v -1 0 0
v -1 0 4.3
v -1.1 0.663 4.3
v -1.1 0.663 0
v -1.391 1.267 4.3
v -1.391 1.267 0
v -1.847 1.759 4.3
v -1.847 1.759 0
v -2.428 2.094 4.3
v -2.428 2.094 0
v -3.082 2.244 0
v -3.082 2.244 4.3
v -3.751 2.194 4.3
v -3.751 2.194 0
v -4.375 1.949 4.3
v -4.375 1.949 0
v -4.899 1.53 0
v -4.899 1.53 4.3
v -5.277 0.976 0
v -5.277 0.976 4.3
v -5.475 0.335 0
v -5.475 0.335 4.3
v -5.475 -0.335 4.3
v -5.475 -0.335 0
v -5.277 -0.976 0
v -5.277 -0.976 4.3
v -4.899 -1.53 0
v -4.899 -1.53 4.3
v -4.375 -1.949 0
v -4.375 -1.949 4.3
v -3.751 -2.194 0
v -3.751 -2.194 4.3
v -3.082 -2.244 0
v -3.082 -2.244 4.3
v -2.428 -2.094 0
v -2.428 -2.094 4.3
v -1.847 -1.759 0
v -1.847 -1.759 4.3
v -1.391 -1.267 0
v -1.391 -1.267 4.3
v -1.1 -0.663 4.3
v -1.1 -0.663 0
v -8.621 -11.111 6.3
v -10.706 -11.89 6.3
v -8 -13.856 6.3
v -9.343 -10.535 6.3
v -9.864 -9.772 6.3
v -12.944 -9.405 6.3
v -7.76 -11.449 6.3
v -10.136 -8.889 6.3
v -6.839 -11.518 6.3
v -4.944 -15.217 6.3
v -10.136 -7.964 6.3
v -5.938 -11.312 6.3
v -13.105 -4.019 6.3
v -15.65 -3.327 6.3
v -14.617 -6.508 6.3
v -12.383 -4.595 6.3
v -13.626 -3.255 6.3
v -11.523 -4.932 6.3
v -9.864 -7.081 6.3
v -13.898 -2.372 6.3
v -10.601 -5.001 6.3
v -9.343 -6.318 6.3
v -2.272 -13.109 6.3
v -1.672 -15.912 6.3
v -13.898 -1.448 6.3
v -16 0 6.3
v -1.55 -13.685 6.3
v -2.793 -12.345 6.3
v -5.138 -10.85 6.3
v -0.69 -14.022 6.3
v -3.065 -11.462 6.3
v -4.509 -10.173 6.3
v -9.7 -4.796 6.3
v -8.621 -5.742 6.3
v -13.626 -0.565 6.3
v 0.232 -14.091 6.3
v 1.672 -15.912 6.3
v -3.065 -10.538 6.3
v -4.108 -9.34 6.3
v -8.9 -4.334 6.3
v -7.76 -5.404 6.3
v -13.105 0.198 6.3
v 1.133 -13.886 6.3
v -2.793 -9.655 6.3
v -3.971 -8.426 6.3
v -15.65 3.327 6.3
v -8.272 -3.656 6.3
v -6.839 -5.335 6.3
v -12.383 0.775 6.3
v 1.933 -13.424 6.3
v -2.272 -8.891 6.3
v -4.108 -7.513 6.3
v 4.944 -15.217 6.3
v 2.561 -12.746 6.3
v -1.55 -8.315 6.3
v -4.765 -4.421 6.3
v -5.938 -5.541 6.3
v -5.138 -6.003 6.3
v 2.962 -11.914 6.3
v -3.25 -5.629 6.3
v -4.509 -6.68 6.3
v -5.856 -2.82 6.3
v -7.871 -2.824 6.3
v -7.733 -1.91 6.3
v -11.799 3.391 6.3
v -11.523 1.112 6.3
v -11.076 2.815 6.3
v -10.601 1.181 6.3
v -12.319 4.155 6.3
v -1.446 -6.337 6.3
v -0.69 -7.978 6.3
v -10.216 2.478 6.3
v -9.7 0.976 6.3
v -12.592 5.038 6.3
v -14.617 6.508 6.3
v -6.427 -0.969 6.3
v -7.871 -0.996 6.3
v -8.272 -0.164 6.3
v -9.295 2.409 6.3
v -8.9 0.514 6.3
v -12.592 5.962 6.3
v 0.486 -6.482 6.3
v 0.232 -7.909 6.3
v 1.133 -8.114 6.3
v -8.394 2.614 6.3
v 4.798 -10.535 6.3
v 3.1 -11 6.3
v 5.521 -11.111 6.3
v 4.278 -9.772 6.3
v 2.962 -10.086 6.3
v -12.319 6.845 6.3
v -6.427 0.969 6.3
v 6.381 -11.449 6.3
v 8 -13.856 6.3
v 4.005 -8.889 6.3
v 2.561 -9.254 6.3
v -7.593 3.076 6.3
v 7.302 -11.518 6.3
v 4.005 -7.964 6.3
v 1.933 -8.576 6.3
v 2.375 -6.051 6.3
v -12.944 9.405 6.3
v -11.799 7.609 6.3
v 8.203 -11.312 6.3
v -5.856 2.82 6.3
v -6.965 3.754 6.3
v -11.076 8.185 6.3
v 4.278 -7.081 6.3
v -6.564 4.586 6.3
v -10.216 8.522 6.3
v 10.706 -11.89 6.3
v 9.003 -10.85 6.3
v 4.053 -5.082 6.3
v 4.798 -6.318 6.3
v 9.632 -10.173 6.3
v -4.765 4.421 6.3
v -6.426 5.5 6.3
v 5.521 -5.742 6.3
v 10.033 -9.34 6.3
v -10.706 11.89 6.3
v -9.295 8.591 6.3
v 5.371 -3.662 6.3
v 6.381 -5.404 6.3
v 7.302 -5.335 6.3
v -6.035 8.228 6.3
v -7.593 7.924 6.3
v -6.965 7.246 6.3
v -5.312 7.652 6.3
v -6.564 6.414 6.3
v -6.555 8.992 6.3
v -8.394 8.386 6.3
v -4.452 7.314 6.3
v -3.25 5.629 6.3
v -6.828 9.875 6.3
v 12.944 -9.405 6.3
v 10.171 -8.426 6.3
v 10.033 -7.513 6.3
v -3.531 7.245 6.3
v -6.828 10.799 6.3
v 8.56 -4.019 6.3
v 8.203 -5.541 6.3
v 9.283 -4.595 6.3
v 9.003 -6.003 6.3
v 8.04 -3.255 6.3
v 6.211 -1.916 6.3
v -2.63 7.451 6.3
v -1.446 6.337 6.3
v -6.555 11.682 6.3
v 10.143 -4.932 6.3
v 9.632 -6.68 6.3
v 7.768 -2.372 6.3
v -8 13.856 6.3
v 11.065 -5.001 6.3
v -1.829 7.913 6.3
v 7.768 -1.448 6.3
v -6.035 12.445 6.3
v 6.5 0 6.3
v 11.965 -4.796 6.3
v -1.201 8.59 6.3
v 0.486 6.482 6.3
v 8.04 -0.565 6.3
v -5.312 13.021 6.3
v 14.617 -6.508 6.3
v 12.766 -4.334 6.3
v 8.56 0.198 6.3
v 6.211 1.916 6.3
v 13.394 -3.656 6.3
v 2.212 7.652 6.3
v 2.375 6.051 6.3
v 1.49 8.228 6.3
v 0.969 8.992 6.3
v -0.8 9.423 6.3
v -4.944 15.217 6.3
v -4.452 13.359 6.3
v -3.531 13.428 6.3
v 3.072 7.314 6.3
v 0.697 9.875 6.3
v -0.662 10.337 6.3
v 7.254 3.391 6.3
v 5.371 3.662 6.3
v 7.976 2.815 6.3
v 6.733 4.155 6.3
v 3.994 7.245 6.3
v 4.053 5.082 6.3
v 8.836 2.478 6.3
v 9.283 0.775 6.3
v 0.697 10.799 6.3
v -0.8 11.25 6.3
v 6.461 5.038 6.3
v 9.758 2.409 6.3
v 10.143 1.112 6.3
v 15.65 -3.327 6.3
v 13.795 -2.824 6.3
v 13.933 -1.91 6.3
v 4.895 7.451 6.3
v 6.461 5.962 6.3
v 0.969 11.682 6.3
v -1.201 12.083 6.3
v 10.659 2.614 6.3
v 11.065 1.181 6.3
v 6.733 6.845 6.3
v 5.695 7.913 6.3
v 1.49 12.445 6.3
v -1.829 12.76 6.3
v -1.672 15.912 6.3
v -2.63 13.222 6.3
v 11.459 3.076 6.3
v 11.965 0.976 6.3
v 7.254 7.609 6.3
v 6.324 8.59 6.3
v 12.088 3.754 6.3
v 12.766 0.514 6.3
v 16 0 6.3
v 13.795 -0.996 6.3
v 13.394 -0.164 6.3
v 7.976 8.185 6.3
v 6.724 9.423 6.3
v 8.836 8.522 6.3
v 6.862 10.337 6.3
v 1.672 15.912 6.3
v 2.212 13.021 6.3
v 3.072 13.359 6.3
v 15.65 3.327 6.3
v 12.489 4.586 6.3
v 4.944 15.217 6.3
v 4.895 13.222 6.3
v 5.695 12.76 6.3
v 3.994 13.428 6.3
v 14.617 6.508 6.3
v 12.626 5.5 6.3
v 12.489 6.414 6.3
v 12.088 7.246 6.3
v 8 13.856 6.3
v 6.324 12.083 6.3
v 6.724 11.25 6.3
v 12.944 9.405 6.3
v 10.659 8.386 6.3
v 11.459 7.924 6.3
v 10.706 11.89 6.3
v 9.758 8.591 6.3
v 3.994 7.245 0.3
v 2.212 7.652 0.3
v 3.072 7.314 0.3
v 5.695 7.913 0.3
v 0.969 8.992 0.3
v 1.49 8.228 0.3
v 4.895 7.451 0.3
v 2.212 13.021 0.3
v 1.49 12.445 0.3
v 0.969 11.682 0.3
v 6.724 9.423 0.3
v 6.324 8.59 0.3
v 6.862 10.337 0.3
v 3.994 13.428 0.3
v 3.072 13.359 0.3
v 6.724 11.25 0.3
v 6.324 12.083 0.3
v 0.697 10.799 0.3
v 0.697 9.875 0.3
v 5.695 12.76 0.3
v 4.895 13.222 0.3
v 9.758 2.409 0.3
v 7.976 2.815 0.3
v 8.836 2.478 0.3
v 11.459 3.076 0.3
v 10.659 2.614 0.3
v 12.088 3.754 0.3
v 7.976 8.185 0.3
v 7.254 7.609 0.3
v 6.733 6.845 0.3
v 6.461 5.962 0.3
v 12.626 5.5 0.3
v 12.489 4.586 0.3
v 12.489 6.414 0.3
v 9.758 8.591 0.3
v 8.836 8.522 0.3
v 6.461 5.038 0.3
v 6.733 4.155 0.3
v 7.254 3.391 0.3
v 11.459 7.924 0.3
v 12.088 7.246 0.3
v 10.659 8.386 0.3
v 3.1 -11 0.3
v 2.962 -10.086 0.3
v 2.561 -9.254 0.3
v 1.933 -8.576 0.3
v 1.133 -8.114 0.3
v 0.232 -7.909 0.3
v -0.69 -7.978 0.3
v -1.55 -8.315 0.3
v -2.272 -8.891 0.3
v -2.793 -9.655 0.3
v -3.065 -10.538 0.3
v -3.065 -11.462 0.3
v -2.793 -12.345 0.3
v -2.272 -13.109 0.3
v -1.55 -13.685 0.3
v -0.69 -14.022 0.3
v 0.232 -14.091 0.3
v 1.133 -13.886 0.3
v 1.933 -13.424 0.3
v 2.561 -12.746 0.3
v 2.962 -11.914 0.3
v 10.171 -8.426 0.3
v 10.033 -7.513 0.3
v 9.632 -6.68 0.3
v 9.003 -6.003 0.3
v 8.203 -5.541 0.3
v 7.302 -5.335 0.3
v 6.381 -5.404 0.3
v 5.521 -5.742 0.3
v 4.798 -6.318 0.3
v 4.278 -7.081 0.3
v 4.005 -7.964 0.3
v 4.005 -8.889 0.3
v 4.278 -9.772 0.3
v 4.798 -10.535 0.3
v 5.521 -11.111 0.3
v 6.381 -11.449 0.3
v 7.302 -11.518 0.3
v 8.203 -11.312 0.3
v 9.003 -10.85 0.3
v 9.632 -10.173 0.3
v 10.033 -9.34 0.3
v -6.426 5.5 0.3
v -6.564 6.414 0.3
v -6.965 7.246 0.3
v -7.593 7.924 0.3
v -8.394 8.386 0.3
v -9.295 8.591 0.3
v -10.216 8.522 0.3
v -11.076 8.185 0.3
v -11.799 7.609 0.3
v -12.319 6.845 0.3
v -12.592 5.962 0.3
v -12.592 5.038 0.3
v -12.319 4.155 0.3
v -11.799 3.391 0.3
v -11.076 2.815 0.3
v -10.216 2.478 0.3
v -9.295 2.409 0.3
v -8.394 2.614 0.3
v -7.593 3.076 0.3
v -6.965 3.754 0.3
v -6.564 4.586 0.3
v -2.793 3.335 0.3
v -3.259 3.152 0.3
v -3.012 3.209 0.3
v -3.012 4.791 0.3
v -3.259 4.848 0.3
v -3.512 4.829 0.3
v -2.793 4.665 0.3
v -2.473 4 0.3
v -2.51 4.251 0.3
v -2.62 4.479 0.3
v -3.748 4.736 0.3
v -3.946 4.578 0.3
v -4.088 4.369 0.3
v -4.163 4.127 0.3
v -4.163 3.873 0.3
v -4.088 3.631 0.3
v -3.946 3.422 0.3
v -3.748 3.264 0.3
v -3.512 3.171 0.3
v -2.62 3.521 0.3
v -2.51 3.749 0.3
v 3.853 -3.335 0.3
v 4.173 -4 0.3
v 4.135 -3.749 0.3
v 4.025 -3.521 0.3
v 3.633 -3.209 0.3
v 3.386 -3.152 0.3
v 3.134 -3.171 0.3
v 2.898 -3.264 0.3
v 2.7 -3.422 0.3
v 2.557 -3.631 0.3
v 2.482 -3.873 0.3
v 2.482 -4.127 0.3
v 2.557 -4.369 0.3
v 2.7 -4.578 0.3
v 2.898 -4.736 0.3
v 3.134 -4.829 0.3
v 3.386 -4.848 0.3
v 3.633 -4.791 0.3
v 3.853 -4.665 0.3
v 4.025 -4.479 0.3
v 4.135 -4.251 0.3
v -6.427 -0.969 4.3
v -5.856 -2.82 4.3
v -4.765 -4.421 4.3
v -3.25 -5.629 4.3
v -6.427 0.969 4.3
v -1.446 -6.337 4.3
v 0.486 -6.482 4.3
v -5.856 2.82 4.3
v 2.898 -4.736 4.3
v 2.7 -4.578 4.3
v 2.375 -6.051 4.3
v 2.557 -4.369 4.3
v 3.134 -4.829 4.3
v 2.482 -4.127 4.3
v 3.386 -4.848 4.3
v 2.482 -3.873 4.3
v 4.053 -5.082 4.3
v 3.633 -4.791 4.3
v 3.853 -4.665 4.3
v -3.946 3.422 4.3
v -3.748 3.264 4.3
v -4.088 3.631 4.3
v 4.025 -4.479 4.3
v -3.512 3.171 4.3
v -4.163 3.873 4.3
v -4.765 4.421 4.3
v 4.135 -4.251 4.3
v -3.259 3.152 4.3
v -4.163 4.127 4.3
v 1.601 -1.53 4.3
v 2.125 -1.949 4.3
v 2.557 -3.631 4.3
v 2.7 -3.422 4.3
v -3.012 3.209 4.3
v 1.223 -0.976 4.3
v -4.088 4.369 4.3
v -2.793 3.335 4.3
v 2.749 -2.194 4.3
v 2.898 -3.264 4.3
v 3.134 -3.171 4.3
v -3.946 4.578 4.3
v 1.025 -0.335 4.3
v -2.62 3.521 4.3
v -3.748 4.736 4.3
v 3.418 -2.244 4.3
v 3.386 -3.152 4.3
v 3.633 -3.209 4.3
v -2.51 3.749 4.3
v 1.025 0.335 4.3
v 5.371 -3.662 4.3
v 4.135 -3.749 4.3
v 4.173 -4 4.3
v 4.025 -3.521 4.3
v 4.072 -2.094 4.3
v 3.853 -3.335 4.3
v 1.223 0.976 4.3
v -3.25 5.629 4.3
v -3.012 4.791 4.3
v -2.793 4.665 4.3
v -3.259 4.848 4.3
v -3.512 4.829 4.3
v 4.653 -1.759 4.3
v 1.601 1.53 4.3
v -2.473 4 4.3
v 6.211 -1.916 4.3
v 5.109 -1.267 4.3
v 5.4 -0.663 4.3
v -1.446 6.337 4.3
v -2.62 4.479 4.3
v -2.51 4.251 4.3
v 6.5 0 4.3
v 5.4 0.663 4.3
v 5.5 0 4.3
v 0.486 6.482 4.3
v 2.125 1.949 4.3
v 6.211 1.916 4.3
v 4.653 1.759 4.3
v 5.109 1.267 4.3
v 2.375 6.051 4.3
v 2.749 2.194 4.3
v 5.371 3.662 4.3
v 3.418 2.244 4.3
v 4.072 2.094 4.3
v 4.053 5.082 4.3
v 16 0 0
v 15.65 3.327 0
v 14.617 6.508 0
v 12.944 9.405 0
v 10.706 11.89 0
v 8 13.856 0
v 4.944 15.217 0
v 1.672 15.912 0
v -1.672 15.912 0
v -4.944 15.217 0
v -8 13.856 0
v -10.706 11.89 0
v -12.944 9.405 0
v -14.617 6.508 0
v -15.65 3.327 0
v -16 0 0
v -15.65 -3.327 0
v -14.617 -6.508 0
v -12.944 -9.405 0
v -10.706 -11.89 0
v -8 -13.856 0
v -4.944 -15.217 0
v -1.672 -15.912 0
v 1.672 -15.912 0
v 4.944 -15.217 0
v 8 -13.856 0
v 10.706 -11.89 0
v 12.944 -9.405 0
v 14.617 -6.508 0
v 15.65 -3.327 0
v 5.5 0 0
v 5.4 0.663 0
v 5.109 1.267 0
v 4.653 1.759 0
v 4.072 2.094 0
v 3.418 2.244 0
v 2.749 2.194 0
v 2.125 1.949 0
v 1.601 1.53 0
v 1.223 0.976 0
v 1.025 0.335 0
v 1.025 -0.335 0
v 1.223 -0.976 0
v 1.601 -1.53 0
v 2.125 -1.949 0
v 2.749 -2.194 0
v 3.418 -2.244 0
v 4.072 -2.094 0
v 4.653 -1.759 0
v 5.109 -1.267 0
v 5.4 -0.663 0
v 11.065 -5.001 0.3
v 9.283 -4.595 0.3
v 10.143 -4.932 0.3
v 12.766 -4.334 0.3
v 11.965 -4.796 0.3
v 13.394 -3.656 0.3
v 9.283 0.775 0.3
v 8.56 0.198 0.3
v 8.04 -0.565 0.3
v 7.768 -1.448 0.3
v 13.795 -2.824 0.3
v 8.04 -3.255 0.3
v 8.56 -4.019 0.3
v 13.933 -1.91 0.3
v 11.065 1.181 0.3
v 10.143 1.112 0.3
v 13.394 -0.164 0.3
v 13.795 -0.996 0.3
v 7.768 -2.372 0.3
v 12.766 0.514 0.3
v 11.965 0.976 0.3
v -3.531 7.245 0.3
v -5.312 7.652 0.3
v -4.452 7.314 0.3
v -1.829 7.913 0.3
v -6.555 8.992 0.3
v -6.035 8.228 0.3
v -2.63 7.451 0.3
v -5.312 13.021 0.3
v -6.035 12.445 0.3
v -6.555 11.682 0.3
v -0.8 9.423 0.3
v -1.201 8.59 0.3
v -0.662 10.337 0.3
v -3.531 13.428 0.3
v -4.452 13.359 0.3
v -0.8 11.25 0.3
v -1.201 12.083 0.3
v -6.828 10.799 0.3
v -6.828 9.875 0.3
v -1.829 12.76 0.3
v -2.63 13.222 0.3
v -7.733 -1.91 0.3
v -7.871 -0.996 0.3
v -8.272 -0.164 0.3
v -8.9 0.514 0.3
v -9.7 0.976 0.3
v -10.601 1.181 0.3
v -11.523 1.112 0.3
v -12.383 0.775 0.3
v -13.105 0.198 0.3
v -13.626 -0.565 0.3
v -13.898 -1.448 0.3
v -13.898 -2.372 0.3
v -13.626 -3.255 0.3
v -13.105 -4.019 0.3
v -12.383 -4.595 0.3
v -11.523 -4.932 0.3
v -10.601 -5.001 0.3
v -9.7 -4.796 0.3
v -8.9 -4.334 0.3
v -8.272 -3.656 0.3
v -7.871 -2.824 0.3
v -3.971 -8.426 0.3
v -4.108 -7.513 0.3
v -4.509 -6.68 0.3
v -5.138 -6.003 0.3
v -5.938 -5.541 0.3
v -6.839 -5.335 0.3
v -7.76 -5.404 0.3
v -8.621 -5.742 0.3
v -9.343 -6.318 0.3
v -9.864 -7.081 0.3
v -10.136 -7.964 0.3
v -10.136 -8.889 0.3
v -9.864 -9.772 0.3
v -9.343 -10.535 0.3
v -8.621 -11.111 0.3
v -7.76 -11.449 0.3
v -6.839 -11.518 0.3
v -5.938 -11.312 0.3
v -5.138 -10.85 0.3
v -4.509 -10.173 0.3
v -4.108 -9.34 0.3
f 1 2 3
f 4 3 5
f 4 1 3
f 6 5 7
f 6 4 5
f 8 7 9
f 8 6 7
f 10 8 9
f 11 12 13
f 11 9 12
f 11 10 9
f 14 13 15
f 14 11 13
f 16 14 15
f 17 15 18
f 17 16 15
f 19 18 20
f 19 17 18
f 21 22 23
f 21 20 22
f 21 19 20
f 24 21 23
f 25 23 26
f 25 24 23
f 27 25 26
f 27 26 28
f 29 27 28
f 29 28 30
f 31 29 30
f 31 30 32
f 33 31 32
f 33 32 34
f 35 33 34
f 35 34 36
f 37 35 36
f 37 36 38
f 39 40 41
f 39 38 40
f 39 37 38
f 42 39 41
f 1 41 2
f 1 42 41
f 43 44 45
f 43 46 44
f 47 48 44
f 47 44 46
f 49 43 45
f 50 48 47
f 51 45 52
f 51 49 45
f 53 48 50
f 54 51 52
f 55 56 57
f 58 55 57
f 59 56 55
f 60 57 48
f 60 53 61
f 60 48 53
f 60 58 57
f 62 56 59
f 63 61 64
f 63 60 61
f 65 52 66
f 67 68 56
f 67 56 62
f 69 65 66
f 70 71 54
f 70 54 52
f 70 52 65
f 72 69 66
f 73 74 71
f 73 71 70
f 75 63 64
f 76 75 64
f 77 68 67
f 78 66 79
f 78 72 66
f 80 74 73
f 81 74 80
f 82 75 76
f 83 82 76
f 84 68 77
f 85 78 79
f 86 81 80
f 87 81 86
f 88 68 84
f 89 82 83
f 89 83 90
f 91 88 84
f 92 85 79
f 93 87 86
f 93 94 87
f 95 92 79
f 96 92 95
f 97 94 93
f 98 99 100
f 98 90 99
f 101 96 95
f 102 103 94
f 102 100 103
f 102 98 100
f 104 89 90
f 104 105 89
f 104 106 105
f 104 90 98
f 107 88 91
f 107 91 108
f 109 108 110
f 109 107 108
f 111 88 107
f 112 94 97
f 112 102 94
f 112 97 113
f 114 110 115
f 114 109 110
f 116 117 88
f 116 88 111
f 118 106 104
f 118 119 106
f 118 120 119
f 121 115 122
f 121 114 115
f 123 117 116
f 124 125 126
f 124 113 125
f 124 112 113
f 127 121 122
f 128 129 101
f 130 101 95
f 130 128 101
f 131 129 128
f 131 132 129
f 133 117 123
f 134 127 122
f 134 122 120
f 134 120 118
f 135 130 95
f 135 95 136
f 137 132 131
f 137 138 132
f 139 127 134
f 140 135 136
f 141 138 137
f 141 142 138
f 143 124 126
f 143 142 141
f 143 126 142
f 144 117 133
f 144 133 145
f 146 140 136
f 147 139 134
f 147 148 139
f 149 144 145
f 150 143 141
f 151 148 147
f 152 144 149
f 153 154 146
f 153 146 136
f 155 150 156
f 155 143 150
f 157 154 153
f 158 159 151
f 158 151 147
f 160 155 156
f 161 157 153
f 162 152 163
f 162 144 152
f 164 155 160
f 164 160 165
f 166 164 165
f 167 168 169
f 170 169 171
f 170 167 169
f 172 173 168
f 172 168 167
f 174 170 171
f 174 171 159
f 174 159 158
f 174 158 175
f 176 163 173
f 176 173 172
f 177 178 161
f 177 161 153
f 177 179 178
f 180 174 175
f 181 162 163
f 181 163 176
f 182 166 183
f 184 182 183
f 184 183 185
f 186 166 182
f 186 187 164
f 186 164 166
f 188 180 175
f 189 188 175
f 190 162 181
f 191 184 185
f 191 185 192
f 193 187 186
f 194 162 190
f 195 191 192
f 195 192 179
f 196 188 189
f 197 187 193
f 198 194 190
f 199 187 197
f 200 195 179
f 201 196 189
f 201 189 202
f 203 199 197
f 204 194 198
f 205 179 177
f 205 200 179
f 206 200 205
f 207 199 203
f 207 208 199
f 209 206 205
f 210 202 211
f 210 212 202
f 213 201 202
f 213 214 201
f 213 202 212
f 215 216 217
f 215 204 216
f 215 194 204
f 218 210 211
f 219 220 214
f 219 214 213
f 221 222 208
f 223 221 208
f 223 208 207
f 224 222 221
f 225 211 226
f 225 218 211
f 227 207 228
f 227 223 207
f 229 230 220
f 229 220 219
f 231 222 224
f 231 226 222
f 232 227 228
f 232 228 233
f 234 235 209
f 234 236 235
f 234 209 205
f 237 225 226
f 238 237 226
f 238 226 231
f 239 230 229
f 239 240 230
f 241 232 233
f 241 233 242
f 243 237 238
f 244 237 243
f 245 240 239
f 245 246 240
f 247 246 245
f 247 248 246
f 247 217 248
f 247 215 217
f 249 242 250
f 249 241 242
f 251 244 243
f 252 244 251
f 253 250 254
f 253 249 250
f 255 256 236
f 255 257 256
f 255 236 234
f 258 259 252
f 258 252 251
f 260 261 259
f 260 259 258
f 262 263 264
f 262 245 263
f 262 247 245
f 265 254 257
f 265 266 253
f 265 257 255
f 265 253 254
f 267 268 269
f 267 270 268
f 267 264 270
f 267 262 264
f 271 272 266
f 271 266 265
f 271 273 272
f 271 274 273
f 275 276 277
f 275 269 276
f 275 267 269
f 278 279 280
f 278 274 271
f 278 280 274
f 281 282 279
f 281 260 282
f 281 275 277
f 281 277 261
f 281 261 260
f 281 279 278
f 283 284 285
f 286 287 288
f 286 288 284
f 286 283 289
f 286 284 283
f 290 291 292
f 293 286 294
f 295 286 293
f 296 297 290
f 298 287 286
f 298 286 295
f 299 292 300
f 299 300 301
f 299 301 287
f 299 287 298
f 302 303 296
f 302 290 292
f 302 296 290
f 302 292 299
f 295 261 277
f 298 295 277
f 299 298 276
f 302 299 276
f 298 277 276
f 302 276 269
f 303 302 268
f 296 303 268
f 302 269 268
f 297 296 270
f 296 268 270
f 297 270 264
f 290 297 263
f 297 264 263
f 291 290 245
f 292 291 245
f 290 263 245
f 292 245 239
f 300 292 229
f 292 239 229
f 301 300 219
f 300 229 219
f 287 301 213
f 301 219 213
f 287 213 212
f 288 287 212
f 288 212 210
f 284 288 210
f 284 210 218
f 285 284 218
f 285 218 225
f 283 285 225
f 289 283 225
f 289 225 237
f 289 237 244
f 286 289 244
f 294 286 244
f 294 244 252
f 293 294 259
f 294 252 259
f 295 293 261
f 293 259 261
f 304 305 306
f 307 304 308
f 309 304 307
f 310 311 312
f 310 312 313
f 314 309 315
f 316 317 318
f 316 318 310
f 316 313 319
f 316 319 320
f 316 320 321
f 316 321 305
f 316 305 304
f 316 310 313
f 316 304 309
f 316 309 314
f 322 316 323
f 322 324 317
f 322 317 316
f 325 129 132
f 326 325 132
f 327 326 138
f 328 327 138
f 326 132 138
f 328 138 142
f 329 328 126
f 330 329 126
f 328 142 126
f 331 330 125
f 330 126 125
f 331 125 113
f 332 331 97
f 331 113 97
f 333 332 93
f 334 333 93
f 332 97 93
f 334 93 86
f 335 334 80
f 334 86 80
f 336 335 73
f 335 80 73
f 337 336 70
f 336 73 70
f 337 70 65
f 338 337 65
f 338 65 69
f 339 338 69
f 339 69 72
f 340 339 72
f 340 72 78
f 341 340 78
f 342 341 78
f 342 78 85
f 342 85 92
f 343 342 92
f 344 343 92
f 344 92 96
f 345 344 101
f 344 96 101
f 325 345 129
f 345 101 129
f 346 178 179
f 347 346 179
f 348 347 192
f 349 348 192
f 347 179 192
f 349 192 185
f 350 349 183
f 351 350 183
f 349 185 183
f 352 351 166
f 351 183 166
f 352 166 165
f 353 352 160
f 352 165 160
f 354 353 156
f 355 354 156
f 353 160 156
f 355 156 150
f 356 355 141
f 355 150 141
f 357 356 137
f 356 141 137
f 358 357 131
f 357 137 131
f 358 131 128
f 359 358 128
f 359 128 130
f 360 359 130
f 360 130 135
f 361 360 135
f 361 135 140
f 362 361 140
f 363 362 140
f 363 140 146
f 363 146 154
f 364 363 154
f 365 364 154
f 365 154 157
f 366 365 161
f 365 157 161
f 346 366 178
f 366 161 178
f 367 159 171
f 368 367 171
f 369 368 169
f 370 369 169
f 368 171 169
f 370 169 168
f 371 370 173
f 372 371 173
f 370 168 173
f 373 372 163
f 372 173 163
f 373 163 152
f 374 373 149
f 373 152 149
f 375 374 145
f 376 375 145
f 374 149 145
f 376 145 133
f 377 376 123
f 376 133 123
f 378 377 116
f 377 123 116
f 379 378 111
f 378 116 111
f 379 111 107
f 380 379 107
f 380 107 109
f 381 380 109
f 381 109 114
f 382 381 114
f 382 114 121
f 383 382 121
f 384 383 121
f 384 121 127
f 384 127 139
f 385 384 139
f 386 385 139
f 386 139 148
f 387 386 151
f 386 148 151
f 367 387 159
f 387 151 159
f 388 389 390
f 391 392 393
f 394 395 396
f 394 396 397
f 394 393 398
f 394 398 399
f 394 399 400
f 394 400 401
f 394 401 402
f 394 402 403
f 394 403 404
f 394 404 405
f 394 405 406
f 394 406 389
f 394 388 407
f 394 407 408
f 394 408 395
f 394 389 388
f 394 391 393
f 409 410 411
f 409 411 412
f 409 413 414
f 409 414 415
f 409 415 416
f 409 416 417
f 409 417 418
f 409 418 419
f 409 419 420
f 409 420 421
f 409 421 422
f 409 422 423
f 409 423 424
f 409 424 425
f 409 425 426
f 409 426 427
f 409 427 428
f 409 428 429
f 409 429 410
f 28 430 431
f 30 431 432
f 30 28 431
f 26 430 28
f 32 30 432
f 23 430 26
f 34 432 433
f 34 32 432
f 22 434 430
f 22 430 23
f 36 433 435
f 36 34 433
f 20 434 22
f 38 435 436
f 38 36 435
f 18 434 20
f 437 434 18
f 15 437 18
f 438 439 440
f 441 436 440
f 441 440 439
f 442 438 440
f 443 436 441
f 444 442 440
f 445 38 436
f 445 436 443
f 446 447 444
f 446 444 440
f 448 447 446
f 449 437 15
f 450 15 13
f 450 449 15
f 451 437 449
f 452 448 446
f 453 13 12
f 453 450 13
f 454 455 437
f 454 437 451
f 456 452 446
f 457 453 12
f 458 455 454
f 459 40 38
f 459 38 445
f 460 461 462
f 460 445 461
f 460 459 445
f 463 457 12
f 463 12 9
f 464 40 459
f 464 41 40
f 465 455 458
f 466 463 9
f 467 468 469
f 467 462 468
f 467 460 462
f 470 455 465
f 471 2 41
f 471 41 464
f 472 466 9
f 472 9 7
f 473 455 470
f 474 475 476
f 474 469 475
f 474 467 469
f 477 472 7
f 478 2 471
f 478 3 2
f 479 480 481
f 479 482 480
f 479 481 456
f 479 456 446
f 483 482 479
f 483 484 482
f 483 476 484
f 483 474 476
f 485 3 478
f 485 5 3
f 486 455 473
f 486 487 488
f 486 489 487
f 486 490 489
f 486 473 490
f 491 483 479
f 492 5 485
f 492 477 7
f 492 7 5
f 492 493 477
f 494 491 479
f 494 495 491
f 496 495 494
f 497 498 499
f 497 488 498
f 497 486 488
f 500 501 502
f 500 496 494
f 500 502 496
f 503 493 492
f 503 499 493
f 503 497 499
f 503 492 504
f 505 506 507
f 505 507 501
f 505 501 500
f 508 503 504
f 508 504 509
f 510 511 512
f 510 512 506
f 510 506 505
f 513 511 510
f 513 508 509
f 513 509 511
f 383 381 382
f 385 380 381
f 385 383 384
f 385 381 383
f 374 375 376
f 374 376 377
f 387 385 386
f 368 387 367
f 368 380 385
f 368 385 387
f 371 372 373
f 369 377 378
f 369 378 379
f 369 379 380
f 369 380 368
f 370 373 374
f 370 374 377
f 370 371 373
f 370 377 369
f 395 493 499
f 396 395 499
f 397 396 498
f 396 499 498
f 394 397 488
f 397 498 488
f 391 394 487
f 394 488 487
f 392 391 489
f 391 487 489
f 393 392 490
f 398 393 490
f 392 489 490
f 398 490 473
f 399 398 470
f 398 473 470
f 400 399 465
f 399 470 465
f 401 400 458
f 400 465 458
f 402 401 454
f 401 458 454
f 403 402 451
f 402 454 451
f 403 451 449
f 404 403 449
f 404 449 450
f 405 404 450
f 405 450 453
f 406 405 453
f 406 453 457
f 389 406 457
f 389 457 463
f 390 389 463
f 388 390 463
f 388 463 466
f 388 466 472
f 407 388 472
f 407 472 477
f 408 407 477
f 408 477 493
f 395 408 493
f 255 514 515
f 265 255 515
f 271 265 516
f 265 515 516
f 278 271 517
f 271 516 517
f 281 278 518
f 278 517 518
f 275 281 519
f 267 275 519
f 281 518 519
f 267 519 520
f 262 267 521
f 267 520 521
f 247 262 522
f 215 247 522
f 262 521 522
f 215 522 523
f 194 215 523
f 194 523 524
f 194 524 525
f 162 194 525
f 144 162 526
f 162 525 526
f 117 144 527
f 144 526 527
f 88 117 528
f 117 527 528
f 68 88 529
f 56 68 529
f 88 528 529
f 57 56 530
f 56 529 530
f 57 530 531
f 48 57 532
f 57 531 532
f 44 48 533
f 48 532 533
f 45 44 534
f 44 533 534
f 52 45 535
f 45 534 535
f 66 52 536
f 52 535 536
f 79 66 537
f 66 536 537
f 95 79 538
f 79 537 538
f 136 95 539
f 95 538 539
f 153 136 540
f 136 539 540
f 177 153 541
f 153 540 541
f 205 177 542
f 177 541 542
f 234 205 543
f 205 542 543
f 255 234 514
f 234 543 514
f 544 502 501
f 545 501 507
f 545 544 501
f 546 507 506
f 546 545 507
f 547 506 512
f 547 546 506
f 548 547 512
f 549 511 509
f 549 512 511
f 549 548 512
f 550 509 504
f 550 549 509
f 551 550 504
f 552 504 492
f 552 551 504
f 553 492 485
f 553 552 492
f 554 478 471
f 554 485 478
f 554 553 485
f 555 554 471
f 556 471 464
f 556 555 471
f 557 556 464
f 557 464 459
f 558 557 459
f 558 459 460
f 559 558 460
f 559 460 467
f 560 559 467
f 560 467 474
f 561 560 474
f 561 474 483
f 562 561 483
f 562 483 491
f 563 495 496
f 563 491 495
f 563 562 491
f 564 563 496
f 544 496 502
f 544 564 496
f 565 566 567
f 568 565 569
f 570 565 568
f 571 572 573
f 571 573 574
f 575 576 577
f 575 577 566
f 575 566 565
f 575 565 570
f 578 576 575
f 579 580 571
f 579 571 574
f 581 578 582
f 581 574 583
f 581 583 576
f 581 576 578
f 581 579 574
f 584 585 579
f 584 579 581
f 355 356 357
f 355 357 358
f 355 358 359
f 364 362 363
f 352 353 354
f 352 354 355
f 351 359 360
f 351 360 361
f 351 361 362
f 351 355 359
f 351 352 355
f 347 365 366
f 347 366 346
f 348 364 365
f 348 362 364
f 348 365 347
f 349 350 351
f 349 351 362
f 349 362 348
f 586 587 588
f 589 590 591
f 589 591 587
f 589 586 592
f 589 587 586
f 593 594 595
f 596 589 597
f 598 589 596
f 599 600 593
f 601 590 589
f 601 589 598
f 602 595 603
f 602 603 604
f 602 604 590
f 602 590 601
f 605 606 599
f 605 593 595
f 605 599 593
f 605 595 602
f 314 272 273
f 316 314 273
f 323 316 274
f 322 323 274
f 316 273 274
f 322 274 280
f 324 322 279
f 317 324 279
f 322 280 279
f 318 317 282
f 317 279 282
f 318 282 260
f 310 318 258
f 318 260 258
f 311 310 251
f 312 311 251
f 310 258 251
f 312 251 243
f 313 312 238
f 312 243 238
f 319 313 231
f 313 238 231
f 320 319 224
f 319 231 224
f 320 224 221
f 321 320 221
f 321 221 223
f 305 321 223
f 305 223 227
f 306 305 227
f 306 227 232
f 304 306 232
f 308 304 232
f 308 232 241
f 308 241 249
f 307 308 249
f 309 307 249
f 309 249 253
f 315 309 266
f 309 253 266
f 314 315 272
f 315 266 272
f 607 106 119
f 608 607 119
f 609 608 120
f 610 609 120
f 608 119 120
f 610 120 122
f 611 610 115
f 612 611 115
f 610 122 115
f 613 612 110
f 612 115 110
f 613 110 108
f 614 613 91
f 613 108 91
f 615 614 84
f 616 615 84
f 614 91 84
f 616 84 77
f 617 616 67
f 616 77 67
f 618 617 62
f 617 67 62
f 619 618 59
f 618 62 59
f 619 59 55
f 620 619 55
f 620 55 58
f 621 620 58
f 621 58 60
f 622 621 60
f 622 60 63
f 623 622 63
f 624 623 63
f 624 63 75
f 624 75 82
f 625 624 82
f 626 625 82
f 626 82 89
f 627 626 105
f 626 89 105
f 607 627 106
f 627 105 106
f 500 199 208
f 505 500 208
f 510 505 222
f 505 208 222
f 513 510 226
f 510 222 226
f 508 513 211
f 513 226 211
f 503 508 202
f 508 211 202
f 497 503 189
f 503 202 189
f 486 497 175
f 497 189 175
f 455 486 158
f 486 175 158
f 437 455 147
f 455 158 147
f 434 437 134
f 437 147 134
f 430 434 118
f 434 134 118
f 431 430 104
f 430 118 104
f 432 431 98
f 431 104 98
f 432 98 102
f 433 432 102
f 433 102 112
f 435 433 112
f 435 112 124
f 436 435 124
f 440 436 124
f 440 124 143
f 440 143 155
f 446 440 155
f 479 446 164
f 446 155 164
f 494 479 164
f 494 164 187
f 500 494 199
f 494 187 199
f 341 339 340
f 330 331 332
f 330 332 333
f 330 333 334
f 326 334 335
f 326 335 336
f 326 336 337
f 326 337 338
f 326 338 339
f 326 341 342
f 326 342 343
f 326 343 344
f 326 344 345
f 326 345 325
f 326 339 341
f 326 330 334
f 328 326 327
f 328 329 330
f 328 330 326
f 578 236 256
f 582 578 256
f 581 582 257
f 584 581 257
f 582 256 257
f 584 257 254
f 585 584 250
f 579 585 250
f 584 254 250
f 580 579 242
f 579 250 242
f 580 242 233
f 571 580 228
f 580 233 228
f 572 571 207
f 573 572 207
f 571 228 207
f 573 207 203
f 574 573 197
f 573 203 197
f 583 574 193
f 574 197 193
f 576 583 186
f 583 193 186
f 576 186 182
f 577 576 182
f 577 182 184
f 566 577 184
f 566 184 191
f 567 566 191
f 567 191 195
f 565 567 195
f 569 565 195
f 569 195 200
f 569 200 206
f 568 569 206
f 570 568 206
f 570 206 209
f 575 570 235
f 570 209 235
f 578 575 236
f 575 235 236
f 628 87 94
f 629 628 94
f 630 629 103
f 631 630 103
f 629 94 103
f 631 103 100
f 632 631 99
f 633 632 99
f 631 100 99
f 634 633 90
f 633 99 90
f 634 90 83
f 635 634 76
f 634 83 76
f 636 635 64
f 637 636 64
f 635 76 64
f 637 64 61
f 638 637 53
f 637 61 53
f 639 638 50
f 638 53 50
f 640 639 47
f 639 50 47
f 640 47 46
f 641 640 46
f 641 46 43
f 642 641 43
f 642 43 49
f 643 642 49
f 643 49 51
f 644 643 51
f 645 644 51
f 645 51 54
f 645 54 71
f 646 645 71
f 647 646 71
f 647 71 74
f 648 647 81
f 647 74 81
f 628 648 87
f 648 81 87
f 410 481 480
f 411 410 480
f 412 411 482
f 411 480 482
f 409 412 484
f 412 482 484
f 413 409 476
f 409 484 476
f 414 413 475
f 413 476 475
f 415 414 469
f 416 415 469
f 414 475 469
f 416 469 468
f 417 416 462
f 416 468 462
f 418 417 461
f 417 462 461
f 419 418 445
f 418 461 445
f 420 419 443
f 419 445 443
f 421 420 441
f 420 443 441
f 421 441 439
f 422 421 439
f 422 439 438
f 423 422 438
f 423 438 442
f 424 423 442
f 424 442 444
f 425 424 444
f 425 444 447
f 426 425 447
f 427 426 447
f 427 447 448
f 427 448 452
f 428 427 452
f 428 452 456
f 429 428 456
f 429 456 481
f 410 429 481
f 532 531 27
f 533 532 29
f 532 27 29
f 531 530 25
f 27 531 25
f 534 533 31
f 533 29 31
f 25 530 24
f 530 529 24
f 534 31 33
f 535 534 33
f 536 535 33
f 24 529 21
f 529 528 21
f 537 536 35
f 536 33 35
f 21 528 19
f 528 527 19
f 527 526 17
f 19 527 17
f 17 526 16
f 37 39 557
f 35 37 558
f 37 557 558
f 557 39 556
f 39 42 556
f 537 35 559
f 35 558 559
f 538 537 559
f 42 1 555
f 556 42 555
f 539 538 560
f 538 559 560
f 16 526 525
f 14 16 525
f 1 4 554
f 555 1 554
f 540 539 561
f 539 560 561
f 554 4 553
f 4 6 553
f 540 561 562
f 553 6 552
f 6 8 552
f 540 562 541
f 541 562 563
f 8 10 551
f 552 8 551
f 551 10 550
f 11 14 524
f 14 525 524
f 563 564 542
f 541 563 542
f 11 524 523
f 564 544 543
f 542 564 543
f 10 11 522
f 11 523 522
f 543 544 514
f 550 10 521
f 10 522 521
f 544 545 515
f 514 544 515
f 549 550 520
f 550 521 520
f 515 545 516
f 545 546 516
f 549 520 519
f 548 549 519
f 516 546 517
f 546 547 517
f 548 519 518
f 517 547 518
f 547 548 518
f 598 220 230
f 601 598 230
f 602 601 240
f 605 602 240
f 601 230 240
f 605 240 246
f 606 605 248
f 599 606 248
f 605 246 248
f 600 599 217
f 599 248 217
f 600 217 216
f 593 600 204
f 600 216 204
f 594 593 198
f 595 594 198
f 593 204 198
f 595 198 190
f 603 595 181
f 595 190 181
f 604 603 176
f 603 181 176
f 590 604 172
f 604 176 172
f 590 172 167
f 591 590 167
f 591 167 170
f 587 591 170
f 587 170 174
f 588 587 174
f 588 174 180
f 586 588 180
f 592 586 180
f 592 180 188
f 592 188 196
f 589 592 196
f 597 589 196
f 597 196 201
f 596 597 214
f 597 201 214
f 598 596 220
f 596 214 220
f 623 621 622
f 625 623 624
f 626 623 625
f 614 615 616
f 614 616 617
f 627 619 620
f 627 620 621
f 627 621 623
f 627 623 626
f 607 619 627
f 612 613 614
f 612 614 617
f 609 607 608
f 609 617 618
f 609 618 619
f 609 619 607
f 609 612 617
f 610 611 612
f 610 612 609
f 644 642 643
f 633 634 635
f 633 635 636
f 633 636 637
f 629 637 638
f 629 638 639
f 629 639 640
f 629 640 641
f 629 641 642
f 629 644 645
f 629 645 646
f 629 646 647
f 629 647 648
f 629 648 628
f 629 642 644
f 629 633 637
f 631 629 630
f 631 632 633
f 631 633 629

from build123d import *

# Parameters (mm, degrees)
SKETCH_R        = 16
SKETCH_R_2      = 2.25
PAD_DEPTH       = 6.3
SKETCH003_R     = 3.1
POCKET_DEPTH    = 6
SKETCH004_R     = 6.5
POCKET001_DEPTH = 2
SKETCH005_R     = 0.85
POCKET002_DEPTH = 6


with BuildPart() as part:
    # Sketch → Pad (new body)
    with BuildSketch(Plane.XY):
        Circle(SKETCH_R)
        with Locations((-3.25, 0)):
            Circle(SKETCH_R_2, mode=Mode.SUBTRACT)
        with Locations((3.25, 0)):
            Circle(SKETCH_R_2, mode=Mode.SUBTRACT)
    extrude(amount=PAD_DEPTH)

    # Sketch003 (on Face5 of Pad) → Pocket (cut)
    with BuildSketch(Plane.XY.offset(6.3)):
        with Locations((9.526279, 5.5)):
            Circle(SKETCH003_R)
        with Locations((3.762222, 10.336619)):
            Circle(SKETCH003_R)
        with Locations((-3.762222, 10.336619)):
            Circle(SKETCH003_R)
        with Locations((-9.526279, 5.5)):
            Circle(SKETCH003_R)
        with Locations((-10.832885, -1.91013)):
            Circle(SKETCH003_R)
        with Locations((-7.070664, -8.426489)):
            Circle(SKETCH003_R)
        with Locations((0, -11)):
            Circle(SKETCH003_R)
        with Locations((7.070664, -8.426489)):
            Circle(SKETCH003_R)
        with Locations((10.832885, -1.91013)):
            Circle(SKETCH003_R)
    extrude(amount=-POCKET_DEPTH, mode=Mode.SUBTRACT)

    # Sketch004 (on Face3 of Pocket) → Pocket001 (cut)
    with BuildSketch(Plane.XY.offset(6.3)):
        Circle(SKETCH004_R)
    extrude(amount=-POCKET001_DEPTH, mode=Mode.SUBTRACT)

    # Sketch005 (on Face3 of Pocket001) → Pocket002 (cut)
    with BuildSketch(Plane.XY.offset(6.3)):
        with Locations((3.32265, -4)):
            Circle(SKETCH005_R)
        with Locations((-3.32265, 4)):
            Circle(SKETCH005_R)
    extrude(amount=-POCKET002_DEPTH, mode=Mode.SUBTRACT)


solid = part.part
